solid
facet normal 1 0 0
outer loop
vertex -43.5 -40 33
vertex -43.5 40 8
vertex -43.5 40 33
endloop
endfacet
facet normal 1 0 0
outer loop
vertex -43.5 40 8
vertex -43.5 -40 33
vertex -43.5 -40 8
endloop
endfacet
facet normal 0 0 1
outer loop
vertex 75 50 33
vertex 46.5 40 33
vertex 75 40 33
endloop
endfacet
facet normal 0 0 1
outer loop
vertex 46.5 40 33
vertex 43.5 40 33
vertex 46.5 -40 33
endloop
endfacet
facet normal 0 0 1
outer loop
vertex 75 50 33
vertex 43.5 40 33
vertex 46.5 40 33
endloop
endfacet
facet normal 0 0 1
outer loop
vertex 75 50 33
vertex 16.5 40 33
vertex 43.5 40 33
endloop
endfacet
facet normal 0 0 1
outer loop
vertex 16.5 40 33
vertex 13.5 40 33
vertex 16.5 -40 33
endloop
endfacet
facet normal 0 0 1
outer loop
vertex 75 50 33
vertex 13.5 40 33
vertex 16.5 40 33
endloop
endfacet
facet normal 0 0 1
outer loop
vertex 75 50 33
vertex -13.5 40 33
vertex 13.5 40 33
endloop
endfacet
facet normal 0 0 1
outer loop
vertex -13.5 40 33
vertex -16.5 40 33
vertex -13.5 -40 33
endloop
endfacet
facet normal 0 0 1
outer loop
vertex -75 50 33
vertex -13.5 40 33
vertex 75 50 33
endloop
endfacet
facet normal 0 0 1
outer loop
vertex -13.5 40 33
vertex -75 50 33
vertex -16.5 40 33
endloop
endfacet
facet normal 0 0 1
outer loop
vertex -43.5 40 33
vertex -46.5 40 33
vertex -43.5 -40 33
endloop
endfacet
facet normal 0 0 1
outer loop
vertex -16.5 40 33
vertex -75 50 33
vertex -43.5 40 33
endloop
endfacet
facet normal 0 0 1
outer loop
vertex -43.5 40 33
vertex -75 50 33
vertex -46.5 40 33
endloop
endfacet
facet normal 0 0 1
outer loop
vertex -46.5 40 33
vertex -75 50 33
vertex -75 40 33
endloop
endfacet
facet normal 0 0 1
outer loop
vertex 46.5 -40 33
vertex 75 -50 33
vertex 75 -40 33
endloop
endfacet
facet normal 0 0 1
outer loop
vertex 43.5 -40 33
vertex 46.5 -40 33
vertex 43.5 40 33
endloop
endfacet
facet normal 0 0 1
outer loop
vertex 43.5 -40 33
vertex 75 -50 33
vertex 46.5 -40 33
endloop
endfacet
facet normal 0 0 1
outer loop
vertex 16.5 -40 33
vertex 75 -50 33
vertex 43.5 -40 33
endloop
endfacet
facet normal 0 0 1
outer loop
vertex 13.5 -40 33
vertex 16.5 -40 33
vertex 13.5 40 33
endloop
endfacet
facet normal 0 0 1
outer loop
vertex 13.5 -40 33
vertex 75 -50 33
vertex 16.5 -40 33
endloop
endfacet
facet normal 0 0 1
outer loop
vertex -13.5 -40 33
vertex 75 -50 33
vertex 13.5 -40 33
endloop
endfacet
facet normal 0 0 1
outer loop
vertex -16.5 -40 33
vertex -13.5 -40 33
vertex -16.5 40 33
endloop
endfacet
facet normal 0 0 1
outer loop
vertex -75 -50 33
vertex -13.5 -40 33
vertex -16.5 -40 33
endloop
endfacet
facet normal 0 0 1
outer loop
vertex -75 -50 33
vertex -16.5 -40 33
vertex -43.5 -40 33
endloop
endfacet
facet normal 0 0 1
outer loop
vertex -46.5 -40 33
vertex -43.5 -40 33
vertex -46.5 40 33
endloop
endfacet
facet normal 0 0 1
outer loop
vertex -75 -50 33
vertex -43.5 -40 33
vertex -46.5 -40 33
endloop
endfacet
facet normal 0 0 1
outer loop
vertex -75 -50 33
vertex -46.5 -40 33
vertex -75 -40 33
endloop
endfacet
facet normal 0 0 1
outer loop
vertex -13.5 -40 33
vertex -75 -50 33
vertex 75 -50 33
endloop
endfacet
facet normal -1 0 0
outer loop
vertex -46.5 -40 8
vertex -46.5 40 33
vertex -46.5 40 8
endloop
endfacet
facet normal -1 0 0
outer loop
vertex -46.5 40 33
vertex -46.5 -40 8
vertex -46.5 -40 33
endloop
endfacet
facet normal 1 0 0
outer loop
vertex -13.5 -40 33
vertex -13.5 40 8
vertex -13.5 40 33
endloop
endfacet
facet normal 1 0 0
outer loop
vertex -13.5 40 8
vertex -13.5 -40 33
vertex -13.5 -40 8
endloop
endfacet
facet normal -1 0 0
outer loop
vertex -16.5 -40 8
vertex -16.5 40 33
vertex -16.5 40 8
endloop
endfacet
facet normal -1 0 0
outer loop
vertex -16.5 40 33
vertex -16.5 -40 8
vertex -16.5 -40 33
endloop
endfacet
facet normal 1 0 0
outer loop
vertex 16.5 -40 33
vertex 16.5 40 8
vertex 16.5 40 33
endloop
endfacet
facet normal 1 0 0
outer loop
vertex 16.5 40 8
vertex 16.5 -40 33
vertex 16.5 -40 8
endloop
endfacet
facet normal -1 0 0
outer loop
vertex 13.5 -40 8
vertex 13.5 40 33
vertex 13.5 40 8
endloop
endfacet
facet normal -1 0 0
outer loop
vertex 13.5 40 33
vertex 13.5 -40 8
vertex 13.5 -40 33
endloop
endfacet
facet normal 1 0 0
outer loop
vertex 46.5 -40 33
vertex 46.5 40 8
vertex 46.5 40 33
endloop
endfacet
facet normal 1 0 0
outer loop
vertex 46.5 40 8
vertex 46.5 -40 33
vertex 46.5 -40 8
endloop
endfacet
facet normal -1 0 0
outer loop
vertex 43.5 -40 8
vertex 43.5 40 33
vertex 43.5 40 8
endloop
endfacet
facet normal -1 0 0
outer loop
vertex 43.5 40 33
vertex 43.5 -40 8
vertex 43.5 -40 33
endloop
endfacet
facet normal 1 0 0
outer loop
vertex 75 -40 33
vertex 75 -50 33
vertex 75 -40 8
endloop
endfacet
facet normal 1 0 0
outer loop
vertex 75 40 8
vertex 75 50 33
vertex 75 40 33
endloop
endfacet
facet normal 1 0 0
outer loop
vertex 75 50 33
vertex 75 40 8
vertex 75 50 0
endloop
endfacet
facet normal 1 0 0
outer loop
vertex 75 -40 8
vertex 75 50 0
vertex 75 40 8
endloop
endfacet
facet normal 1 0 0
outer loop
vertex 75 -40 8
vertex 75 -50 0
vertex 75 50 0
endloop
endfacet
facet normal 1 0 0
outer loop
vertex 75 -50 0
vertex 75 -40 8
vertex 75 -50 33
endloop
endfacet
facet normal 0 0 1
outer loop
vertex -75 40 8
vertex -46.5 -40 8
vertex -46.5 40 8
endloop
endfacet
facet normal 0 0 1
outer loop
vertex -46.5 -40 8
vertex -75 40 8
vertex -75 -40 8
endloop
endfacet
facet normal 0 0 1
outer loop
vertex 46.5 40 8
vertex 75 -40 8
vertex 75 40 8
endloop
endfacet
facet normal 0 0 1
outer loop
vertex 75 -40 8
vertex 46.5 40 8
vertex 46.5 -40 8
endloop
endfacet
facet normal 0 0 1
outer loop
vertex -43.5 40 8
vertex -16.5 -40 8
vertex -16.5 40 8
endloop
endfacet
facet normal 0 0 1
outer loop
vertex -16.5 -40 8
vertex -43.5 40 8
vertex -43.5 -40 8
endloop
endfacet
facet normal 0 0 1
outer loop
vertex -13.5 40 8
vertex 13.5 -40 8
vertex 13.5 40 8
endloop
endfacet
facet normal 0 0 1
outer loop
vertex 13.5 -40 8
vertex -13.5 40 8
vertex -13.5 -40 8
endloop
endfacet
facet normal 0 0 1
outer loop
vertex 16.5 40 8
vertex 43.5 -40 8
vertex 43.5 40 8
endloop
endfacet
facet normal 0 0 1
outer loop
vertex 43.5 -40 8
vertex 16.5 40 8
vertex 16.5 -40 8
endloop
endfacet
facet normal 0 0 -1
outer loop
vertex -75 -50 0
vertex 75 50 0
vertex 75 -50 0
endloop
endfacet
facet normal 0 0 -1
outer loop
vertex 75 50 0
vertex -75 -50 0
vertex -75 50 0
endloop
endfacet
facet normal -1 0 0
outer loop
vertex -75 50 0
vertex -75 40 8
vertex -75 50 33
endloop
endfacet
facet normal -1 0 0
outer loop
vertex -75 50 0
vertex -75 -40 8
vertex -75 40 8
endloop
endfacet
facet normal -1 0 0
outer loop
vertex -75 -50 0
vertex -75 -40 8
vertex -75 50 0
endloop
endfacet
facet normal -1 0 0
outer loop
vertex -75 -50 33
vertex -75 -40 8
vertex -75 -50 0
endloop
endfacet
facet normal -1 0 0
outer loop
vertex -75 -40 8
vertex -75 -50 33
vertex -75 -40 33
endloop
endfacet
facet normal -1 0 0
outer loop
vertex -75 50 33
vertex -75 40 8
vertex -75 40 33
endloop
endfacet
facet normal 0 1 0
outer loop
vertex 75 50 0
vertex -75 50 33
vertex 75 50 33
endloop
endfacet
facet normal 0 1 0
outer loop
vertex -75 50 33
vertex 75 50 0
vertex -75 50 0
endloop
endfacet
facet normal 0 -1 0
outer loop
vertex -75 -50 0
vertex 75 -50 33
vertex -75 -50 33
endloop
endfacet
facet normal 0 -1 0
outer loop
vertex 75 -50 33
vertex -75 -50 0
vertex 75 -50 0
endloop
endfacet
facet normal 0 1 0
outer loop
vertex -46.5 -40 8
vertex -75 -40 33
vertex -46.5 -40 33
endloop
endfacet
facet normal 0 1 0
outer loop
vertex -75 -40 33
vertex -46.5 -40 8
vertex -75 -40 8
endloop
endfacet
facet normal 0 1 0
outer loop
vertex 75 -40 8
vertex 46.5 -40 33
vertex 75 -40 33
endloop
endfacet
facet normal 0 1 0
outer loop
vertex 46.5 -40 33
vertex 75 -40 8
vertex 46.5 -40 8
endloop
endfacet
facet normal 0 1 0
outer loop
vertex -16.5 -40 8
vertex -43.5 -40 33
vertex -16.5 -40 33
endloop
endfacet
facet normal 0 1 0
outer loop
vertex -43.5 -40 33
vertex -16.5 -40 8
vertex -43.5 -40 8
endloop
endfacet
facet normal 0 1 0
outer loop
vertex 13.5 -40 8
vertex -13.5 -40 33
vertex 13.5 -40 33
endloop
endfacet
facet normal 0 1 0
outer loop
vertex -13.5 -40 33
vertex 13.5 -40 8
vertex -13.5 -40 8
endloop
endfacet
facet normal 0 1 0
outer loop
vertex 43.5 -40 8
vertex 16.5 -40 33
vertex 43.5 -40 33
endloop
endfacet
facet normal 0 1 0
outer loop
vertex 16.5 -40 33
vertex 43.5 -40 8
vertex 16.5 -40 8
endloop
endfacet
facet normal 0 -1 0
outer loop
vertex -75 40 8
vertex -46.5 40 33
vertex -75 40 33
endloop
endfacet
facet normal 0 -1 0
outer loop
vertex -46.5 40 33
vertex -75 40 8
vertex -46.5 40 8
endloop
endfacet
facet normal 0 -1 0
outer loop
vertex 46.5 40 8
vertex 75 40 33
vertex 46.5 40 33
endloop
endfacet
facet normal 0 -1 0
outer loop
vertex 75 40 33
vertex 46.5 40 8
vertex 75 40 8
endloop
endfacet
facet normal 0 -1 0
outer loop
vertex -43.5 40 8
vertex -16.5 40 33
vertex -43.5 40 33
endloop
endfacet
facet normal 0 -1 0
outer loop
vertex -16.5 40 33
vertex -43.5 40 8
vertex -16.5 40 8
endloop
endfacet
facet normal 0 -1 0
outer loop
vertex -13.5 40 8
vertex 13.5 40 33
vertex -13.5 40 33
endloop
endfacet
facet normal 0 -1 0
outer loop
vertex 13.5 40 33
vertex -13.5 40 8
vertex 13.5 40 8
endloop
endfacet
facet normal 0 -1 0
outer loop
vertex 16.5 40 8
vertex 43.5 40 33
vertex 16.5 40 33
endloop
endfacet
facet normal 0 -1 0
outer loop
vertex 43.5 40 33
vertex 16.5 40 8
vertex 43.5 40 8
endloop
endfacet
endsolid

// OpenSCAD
$fn = 32;

// ----------------------------------------------------------------------
// Rib frame 150 x 100 x 33
// 4 ribs at 30 mm pitch
// ----------------------------------------------------------------------

// --- parameters (mm) ---
frame = [150, 100, 8];  // base plate size (x, y, z)
rail_w = 10;            // side rail width
ribs = 4;               // number of ribs
rib_t = 3;              // rib thickness
rib_h = 25;             // rib height above the base plate
pitch = 30;             // pitch between rib centres

// --- derived feature positions (mm) ---
span = (ribs - 1) * pitch;          // = 90   distance between the outer ribs
origin_x = -span / 2;               // = -45   X of the first rib
rib_len = frame[1] - 2 * rail_w + 2;  // = 82   rib length, 1 mm into each rail
feature_centers = [
  [origin_x + 0 * pitch, 0],
  [origin_x + 1 * pitch, 0],
  [origin_x + 2 * pitch, 0],
  [origin_x + 3 * pitch, 0]
];   // rib centre line, drives the rib loop

// base plate, two side rails, then the ribs read straight off feature_centers
union() {
  translate([-frame[0] / 2, -frame[1] / 2, 0]) cube(frame);
  translate([-frame[0] / 2, -frame[1] / 2, 0]) cube([frame[0], rail_w, frame[2] + rib_h]);
  translate([-frame[0] / 2, frame[1] / 2 - rail_w, 0]) cube([frame[0], rail_w, frame[2] + rib_h]);
  for (centre = feature_centers)
    translate([centre[0] - rib_t / 2, centre[1] - rib_len / 2, frame[2] - 1])
      cube([rib_t, rib_len, rib_h + 1]);
}
